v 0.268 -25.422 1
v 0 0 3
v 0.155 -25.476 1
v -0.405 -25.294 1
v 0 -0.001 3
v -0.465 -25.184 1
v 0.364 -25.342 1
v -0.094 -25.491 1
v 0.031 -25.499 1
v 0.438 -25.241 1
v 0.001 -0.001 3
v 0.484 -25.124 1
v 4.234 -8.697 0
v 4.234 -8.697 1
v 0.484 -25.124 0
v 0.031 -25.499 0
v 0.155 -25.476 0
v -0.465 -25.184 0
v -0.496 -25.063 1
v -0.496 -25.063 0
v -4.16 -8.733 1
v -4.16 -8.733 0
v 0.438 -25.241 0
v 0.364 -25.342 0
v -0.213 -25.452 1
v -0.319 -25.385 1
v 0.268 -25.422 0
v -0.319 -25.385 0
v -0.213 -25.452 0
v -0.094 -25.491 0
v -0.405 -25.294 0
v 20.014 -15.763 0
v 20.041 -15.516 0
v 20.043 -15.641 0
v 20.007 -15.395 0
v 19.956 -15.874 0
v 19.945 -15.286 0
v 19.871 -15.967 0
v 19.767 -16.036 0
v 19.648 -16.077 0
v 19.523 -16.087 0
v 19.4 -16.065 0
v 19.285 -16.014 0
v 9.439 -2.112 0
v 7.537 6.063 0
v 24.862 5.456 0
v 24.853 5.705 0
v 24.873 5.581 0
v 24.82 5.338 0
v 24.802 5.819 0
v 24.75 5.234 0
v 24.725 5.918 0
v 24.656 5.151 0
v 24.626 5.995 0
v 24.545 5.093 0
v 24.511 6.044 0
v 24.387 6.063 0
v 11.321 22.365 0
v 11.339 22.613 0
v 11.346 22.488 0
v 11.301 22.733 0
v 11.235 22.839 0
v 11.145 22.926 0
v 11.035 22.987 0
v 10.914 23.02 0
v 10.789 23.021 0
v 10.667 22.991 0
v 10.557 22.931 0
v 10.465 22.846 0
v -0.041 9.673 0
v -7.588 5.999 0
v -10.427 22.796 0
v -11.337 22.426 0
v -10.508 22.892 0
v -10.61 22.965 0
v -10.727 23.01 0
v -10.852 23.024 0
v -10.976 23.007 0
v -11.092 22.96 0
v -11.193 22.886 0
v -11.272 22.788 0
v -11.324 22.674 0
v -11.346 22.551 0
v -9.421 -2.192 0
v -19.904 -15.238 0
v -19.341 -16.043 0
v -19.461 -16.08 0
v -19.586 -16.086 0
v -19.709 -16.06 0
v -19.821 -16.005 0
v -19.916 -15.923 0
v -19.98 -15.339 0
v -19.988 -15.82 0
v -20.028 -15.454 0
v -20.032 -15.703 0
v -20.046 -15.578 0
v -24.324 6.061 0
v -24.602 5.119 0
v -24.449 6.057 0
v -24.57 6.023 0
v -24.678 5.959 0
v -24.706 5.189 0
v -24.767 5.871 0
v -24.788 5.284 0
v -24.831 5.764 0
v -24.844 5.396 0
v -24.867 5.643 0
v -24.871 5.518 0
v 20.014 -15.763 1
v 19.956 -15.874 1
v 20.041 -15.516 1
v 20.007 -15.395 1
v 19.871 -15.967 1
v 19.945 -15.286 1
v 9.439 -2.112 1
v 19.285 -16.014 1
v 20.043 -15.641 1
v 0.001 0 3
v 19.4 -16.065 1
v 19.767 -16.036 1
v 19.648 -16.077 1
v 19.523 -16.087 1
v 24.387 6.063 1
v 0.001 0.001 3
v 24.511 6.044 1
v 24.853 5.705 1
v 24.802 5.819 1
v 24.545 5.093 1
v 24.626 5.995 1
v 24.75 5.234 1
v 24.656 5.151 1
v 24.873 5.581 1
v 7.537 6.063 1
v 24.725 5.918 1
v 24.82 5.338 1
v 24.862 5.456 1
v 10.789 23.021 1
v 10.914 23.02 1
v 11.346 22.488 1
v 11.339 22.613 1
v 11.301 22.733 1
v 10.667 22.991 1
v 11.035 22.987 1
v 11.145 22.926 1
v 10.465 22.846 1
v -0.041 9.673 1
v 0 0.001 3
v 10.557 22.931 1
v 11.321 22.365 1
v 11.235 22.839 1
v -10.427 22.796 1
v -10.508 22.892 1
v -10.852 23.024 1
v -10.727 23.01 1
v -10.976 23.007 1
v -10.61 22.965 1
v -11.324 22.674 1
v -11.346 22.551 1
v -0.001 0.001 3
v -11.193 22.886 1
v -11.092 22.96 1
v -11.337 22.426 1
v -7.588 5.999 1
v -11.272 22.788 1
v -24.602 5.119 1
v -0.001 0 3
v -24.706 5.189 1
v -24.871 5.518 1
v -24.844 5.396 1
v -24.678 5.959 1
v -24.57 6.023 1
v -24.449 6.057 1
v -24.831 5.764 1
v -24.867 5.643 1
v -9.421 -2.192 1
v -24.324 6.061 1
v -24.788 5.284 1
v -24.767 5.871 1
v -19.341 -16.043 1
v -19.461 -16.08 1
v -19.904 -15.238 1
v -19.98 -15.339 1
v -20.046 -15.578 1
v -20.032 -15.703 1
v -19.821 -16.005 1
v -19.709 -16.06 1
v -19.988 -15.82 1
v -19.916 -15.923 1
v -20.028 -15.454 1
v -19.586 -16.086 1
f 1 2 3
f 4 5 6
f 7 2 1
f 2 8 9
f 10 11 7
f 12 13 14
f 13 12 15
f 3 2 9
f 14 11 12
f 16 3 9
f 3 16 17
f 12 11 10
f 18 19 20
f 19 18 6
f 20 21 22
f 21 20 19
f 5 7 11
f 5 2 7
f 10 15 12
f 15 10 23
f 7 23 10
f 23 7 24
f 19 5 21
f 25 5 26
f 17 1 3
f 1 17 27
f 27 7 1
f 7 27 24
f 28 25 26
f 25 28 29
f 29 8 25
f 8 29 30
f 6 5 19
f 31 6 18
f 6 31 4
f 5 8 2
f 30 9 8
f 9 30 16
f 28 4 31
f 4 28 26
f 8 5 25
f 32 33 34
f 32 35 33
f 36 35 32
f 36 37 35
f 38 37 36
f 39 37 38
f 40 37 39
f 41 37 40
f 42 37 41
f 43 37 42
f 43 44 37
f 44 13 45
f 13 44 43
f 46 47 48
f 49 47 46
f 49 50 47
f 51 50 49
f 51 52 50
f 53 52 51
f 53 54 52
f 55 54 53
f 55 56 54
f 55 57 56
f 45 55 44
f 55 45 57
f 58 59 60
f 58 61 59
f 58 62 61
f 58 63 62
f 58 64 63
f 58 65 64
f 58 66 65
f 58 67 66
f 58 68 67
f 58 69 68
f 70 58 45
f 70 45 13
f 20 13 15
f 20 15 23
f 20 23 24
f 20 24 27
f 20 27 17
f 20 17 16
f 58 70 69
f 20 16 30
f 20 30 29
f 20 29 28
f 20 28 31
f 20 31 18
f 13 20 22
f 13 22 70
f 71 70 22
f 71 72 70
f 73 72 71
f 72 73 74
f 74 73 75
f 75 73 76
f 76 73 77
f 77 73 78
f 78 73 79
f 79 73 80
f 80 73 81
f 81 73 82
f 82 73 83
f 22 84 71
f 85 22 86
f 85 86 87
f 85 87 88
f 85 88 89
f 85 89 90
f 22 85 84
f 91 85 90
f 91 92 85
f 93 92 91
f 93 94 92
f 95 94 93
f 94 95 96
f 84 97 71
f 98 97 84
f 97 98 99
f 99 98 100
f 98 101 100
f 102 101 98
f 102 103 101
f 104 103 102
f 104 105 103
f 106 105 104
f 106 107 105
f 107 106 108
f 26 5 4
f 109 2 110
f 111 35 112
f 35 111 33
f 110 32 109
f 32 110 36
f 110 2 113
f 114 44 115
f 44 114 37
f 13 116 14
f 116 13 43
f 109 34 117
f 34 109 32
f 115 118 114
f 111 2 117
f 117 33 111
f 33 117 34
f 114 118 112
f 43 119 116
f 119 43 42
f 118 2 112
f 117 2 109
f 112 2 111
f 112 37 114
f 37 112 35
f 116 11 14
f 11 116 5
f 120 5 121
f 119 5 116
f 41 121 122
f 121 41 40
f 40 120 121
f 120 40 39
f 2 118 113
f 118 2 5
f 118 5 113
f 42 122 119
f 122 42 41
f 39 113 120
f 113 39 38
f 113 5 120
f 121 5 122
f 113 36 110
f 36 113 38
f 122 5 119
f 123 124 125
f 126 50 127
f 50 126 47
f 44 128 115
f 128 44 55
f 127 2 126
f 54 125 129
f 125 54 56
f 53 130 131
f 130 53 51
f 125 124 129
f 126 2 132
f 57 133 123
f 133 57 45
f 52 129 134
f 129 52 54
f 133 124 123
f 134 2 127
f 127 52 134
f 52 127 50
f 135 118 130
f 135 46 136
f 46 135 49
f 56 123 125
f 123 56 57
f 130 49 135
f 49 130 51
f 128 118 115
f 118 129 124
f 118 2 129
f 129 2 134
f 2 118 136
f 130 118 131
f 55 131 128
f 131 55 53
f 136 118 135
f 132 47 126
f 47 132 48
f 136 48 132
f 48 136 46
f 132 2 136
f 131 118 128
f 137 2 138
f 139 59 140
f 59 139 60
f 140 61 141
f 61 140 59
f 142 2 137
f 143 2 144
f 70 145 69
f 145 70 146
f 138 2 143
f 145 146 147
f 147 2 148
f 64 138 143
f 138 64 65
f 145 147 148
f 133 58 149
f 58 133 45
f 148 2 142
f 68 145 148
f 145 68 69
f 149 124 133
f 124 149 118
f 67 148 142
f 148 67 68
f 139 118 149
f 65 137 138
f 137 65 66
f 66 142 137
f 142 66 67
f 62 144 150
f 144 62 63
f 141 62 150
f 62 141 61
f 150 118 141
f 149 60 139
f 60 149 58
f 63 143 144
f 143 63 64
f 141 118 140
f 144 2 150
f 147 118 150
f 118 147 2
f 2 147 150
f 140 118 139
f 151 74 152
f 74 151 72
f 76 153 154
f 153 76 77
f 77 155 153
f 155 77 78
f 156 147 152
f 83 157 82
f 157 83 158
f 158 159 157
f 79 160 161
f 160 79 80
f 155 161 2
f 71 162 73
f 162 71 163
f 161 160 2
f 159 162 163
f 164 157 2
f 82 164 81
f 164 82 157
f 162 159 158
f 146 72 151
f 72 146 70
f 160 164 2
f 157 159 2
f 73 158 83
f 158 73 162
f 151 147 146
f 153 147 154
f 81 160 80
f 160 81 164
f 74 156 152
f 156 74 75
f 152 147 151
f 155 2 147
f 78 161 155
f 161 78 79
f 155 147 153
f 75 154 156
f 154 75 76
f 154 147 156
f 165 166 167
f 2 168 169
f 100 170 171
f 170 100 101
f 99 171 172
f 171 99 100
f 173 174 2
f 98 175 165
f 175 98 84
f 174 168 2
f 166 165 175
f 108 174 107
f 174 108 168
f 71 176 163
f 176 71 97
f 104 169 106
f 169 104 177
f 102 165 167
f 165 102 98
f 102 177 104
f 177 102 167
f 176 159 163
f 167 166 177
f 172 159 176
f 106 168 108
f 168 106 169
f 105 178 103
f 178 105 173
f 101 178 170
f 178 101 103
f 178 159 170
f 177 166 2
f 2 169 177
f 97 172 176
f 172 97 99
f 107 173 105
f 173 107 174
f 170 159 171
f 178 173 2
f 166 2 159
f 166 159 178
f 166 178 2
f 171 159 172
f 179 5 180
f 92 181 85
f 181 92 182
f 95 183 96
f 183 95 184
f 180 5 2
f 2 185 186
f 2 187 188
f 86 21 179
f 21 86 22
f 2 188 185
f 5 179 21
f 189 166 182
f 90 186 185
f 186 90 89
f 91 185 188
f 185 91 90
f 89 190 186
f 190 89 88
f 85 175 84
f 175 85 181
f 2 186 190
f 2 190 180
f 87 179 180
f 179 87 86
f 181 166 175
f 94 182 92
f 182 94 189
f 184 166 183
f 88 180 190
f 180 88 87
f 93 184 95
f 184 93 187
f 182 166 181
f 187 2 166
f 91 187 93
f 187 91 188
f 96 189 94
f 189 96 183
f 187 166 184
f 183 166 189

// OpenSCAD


// number of points on the star (3 or more makes sense)
_points = 7;
// length of ech point from center.  1/2 the rounding value will be added to the length
_point_len = 25;
// used to adjust width of each point +/-
_adjust = 0;
// point height at end of points (thinkness of objet at thinest part. Should be less than cent_h
_pnt_h = 1;
// height at center of star. set equal to pnt_h for flat object
_cent_h = 3;
// diameter of rounding at end of point (must be greater than 0).
_rnd=1;

// resolution for rounded point
_fn = 25;


// modules in library:
module star_3d(points, point_len, adjust=0, pnt_h =1, cent_h=1, rnd=0.1, fn=25)
{
    // star_3d: star with raised center.
    //----------------------------------------------//
    // points = num points on star (should be >3.  
    //          Using 3 may require addisional 
    //          adjust be applied.)
    // point_len = len of point on star 
    //              (actual len of point will add 
    //              1/2 rnd to the length.)
    // adjust = +/- adjust of width of point
    // pnt_h = height of star at end of point
    // cent_h = height of star in center needs to be > pnt_h to have effect.
    // rnd = roundness of end of point (diameter)
    // fn = $fn value for rounded point
    //----------------------------------------------//
    
    point_deg= 360/points;
    point_deg_adjusted = point_deg + (-point_deg/2) +  adjust;
    
    if(points == 3 && adjust == 0)
    {  // make a pyramid (this is to avoid rendering 
       //            issues in this special case)
        hull()
        {
           for(i=[0:2])
           {
               rotate([0,0,i*point_deg])
               translate([point_len,0,0])
                    cylinder(pnt_h, d=rnd, $fn=fn);
           }
           cylinder(cent_h, d=.001);
        }
    }
    else
    { // use algorithm
        for(i=[0:points-1])
        {
            rotate([0,0,i * point_deg]) 
                translate([0,-point_len,0]) 
                point(point_deg_adjusted, 
                      point_len, 
                      rnd, 
                      pnt_h, 
                      cent_h, 
                      fn);
        }
    }

}

module point(deg, leng, rnd, h1, h2, fn=25)
{   // create a point of the star.
    hull()
    {
        cylinder(h1, d=rnd, $fn=fn);
        translate([0,leng,0]) cylinder(h2, d=.001);
        rotate([0,0,-deg/2]) 
            translate([0,leng,0]) cylinder(h1, d=rnd);
        rotate([0,0,deg/2]) 
            translate([0,leng,0]) cylinder(h1, d=rnd);
    }
}


// test object:
star_3d(points = _points,
        point_len = _point_len,
        adjust = _adjust, 
        pnt_h = _pnt_h, 
        cent_h =_cent_h, 
        rnd = _rnd,
        fn = _fn);

